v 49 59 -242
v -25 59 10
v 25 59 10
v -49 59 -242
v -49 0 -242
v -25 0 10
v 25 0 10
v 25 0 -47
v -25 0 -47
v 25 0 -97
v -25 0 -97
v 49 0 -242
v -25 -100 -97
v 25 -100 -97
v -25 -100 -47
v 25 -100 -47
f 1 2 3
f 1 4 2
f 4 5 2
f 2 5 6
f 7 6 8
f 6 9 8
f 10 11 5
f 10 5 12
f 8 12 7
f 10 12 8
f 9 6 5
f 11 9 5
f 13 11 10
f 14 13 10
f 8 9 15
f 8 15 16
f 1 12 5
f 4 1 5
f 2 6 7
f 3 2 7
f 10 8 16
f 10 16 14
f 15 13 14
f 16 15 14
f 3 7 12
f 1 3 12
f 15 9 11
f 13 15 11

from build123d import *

# Parameters (mm, degrees)
BOSS_EXTRUDE1_DEPTH = 59
SKETCH3_W           = 50
SKETCH3_H           = 50
BOSS_EXTRUDE2_DEPTH = 100


with BuildPart() as part:
    # Sketch1 → Boss-Extrude1 (new body)
    with BuildSketch(Plane(origin=(0, 0, 0), x_dir=(1, 0, 0), z_dir=(0, 1, 0))):
        Polygon((-25, -10), (25, -10), (49, 242), (-49, 242), align=None)
    extrude(amount=BOSS_EXTRUDE1_DEPTH)

    # Sketch3 → Boss-Extrude2 (add)
    with BuildSketch(Plane(origin=(0, 0, 0), x_dir=(1, 0, 0), z_dir=(0, 1, 0))):
        with Locations((0, 72)):
            Rectangle(SKETCH3_W, SKETCH3_H)
    extrude(amount=-BOSS_EXTRUDE2_DEPTH)


solid = part.part
